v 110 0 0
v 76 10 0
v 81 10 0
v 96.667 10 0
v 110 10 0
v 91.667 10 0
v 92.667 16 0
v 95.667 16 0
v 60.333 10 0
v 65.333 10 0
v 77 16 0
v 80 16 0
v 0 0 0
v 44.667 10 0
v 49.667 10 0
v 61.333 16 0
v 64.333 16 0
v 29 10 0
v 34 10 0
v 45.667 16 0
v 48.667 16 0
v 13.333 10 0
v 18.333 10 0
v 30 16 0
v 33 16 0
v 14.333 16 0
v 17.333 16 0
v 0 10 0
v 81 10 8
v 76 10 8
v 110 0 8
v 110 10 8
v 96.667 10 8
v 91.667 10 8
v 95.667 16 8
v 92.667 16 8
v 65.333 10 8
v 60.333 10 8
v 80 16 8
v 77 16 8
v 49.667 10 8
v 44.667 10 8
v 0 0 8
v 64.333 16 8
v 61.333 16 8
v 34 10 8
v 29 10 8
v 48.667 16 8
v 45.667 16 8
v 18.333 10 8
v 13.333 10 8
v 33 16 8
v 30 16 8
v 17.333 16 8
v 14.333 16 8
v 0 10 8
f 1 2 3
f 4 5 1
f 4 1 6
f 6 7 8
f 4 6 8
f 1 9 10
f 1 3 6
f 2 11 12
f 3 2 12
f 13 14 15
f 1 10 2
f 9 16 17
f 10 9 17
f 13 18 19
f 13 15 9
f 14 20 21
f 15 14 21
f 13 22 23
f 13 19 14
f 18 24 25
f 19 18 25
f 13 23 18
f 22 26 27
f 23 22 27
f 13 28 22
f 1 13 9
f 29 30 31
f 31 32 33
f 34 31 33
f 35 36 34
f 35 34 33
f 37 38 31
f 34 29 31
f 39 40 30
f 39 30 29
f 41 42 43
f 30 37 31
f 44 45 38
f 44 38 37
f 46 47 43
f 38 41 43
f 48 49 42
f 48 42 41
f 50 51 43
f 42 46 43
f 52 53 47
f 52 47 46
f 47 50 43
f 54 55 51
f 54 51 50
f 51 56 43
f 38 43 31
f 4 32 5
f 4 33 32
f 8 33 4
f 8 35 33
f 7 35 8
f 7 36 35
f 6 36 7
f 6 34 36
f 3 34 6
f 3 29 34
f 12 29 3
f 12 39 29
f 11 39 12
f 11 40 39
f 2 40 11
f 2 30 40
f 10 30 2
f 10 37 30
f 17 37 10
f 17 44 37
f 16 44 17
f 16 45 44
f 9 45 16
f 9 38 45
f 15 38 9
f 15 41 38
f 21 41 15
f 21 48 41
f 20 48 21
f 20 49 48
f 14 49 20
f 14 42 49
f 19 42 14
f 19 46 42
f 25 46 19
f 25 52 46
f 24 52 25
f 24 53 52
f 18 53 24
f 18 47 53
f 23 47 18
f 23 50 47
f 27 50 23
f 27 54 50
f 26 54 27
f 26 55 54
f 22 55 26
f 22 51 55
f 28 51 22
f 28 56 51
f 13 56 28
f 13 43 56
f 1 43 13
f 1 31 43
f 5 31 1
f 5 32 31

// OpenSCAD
$fn = 32;

// ----------------------------------------------------------------------
// Gear rack: 6 teeth on a 110 mm bar, pitch 15.67 mm
// ----------------------------------------------------------------------

// --- parameters (mm) ---
profile_height = 8;       // extrusion height
profile_points = 28;      // points of the closed outline

profile = [[0, 0], [110, 0], [110, 10], [96.667, 10], [95.667, 16], [92.667, 16], [91.667, 10], [81, 10], [80, 16], [77, 16], [76, 10], [65.333, 10], [64.333, 16], [61.333, 16], [60.333, 10], [49.667, 10], [48.667, 16], [45.667, 16], [44.667, 10], [34, 10], [33, 16], [30, 16], [29, 10], [18.333, 10], [17.333, 16], [14.333, 16], [13.333, 10], [0, 10]];  // single closed polygon, 28 points, counter clockwise

// --- the one profile operation ---
linear_extrude(height = profile_height) polygon(points = profile);
